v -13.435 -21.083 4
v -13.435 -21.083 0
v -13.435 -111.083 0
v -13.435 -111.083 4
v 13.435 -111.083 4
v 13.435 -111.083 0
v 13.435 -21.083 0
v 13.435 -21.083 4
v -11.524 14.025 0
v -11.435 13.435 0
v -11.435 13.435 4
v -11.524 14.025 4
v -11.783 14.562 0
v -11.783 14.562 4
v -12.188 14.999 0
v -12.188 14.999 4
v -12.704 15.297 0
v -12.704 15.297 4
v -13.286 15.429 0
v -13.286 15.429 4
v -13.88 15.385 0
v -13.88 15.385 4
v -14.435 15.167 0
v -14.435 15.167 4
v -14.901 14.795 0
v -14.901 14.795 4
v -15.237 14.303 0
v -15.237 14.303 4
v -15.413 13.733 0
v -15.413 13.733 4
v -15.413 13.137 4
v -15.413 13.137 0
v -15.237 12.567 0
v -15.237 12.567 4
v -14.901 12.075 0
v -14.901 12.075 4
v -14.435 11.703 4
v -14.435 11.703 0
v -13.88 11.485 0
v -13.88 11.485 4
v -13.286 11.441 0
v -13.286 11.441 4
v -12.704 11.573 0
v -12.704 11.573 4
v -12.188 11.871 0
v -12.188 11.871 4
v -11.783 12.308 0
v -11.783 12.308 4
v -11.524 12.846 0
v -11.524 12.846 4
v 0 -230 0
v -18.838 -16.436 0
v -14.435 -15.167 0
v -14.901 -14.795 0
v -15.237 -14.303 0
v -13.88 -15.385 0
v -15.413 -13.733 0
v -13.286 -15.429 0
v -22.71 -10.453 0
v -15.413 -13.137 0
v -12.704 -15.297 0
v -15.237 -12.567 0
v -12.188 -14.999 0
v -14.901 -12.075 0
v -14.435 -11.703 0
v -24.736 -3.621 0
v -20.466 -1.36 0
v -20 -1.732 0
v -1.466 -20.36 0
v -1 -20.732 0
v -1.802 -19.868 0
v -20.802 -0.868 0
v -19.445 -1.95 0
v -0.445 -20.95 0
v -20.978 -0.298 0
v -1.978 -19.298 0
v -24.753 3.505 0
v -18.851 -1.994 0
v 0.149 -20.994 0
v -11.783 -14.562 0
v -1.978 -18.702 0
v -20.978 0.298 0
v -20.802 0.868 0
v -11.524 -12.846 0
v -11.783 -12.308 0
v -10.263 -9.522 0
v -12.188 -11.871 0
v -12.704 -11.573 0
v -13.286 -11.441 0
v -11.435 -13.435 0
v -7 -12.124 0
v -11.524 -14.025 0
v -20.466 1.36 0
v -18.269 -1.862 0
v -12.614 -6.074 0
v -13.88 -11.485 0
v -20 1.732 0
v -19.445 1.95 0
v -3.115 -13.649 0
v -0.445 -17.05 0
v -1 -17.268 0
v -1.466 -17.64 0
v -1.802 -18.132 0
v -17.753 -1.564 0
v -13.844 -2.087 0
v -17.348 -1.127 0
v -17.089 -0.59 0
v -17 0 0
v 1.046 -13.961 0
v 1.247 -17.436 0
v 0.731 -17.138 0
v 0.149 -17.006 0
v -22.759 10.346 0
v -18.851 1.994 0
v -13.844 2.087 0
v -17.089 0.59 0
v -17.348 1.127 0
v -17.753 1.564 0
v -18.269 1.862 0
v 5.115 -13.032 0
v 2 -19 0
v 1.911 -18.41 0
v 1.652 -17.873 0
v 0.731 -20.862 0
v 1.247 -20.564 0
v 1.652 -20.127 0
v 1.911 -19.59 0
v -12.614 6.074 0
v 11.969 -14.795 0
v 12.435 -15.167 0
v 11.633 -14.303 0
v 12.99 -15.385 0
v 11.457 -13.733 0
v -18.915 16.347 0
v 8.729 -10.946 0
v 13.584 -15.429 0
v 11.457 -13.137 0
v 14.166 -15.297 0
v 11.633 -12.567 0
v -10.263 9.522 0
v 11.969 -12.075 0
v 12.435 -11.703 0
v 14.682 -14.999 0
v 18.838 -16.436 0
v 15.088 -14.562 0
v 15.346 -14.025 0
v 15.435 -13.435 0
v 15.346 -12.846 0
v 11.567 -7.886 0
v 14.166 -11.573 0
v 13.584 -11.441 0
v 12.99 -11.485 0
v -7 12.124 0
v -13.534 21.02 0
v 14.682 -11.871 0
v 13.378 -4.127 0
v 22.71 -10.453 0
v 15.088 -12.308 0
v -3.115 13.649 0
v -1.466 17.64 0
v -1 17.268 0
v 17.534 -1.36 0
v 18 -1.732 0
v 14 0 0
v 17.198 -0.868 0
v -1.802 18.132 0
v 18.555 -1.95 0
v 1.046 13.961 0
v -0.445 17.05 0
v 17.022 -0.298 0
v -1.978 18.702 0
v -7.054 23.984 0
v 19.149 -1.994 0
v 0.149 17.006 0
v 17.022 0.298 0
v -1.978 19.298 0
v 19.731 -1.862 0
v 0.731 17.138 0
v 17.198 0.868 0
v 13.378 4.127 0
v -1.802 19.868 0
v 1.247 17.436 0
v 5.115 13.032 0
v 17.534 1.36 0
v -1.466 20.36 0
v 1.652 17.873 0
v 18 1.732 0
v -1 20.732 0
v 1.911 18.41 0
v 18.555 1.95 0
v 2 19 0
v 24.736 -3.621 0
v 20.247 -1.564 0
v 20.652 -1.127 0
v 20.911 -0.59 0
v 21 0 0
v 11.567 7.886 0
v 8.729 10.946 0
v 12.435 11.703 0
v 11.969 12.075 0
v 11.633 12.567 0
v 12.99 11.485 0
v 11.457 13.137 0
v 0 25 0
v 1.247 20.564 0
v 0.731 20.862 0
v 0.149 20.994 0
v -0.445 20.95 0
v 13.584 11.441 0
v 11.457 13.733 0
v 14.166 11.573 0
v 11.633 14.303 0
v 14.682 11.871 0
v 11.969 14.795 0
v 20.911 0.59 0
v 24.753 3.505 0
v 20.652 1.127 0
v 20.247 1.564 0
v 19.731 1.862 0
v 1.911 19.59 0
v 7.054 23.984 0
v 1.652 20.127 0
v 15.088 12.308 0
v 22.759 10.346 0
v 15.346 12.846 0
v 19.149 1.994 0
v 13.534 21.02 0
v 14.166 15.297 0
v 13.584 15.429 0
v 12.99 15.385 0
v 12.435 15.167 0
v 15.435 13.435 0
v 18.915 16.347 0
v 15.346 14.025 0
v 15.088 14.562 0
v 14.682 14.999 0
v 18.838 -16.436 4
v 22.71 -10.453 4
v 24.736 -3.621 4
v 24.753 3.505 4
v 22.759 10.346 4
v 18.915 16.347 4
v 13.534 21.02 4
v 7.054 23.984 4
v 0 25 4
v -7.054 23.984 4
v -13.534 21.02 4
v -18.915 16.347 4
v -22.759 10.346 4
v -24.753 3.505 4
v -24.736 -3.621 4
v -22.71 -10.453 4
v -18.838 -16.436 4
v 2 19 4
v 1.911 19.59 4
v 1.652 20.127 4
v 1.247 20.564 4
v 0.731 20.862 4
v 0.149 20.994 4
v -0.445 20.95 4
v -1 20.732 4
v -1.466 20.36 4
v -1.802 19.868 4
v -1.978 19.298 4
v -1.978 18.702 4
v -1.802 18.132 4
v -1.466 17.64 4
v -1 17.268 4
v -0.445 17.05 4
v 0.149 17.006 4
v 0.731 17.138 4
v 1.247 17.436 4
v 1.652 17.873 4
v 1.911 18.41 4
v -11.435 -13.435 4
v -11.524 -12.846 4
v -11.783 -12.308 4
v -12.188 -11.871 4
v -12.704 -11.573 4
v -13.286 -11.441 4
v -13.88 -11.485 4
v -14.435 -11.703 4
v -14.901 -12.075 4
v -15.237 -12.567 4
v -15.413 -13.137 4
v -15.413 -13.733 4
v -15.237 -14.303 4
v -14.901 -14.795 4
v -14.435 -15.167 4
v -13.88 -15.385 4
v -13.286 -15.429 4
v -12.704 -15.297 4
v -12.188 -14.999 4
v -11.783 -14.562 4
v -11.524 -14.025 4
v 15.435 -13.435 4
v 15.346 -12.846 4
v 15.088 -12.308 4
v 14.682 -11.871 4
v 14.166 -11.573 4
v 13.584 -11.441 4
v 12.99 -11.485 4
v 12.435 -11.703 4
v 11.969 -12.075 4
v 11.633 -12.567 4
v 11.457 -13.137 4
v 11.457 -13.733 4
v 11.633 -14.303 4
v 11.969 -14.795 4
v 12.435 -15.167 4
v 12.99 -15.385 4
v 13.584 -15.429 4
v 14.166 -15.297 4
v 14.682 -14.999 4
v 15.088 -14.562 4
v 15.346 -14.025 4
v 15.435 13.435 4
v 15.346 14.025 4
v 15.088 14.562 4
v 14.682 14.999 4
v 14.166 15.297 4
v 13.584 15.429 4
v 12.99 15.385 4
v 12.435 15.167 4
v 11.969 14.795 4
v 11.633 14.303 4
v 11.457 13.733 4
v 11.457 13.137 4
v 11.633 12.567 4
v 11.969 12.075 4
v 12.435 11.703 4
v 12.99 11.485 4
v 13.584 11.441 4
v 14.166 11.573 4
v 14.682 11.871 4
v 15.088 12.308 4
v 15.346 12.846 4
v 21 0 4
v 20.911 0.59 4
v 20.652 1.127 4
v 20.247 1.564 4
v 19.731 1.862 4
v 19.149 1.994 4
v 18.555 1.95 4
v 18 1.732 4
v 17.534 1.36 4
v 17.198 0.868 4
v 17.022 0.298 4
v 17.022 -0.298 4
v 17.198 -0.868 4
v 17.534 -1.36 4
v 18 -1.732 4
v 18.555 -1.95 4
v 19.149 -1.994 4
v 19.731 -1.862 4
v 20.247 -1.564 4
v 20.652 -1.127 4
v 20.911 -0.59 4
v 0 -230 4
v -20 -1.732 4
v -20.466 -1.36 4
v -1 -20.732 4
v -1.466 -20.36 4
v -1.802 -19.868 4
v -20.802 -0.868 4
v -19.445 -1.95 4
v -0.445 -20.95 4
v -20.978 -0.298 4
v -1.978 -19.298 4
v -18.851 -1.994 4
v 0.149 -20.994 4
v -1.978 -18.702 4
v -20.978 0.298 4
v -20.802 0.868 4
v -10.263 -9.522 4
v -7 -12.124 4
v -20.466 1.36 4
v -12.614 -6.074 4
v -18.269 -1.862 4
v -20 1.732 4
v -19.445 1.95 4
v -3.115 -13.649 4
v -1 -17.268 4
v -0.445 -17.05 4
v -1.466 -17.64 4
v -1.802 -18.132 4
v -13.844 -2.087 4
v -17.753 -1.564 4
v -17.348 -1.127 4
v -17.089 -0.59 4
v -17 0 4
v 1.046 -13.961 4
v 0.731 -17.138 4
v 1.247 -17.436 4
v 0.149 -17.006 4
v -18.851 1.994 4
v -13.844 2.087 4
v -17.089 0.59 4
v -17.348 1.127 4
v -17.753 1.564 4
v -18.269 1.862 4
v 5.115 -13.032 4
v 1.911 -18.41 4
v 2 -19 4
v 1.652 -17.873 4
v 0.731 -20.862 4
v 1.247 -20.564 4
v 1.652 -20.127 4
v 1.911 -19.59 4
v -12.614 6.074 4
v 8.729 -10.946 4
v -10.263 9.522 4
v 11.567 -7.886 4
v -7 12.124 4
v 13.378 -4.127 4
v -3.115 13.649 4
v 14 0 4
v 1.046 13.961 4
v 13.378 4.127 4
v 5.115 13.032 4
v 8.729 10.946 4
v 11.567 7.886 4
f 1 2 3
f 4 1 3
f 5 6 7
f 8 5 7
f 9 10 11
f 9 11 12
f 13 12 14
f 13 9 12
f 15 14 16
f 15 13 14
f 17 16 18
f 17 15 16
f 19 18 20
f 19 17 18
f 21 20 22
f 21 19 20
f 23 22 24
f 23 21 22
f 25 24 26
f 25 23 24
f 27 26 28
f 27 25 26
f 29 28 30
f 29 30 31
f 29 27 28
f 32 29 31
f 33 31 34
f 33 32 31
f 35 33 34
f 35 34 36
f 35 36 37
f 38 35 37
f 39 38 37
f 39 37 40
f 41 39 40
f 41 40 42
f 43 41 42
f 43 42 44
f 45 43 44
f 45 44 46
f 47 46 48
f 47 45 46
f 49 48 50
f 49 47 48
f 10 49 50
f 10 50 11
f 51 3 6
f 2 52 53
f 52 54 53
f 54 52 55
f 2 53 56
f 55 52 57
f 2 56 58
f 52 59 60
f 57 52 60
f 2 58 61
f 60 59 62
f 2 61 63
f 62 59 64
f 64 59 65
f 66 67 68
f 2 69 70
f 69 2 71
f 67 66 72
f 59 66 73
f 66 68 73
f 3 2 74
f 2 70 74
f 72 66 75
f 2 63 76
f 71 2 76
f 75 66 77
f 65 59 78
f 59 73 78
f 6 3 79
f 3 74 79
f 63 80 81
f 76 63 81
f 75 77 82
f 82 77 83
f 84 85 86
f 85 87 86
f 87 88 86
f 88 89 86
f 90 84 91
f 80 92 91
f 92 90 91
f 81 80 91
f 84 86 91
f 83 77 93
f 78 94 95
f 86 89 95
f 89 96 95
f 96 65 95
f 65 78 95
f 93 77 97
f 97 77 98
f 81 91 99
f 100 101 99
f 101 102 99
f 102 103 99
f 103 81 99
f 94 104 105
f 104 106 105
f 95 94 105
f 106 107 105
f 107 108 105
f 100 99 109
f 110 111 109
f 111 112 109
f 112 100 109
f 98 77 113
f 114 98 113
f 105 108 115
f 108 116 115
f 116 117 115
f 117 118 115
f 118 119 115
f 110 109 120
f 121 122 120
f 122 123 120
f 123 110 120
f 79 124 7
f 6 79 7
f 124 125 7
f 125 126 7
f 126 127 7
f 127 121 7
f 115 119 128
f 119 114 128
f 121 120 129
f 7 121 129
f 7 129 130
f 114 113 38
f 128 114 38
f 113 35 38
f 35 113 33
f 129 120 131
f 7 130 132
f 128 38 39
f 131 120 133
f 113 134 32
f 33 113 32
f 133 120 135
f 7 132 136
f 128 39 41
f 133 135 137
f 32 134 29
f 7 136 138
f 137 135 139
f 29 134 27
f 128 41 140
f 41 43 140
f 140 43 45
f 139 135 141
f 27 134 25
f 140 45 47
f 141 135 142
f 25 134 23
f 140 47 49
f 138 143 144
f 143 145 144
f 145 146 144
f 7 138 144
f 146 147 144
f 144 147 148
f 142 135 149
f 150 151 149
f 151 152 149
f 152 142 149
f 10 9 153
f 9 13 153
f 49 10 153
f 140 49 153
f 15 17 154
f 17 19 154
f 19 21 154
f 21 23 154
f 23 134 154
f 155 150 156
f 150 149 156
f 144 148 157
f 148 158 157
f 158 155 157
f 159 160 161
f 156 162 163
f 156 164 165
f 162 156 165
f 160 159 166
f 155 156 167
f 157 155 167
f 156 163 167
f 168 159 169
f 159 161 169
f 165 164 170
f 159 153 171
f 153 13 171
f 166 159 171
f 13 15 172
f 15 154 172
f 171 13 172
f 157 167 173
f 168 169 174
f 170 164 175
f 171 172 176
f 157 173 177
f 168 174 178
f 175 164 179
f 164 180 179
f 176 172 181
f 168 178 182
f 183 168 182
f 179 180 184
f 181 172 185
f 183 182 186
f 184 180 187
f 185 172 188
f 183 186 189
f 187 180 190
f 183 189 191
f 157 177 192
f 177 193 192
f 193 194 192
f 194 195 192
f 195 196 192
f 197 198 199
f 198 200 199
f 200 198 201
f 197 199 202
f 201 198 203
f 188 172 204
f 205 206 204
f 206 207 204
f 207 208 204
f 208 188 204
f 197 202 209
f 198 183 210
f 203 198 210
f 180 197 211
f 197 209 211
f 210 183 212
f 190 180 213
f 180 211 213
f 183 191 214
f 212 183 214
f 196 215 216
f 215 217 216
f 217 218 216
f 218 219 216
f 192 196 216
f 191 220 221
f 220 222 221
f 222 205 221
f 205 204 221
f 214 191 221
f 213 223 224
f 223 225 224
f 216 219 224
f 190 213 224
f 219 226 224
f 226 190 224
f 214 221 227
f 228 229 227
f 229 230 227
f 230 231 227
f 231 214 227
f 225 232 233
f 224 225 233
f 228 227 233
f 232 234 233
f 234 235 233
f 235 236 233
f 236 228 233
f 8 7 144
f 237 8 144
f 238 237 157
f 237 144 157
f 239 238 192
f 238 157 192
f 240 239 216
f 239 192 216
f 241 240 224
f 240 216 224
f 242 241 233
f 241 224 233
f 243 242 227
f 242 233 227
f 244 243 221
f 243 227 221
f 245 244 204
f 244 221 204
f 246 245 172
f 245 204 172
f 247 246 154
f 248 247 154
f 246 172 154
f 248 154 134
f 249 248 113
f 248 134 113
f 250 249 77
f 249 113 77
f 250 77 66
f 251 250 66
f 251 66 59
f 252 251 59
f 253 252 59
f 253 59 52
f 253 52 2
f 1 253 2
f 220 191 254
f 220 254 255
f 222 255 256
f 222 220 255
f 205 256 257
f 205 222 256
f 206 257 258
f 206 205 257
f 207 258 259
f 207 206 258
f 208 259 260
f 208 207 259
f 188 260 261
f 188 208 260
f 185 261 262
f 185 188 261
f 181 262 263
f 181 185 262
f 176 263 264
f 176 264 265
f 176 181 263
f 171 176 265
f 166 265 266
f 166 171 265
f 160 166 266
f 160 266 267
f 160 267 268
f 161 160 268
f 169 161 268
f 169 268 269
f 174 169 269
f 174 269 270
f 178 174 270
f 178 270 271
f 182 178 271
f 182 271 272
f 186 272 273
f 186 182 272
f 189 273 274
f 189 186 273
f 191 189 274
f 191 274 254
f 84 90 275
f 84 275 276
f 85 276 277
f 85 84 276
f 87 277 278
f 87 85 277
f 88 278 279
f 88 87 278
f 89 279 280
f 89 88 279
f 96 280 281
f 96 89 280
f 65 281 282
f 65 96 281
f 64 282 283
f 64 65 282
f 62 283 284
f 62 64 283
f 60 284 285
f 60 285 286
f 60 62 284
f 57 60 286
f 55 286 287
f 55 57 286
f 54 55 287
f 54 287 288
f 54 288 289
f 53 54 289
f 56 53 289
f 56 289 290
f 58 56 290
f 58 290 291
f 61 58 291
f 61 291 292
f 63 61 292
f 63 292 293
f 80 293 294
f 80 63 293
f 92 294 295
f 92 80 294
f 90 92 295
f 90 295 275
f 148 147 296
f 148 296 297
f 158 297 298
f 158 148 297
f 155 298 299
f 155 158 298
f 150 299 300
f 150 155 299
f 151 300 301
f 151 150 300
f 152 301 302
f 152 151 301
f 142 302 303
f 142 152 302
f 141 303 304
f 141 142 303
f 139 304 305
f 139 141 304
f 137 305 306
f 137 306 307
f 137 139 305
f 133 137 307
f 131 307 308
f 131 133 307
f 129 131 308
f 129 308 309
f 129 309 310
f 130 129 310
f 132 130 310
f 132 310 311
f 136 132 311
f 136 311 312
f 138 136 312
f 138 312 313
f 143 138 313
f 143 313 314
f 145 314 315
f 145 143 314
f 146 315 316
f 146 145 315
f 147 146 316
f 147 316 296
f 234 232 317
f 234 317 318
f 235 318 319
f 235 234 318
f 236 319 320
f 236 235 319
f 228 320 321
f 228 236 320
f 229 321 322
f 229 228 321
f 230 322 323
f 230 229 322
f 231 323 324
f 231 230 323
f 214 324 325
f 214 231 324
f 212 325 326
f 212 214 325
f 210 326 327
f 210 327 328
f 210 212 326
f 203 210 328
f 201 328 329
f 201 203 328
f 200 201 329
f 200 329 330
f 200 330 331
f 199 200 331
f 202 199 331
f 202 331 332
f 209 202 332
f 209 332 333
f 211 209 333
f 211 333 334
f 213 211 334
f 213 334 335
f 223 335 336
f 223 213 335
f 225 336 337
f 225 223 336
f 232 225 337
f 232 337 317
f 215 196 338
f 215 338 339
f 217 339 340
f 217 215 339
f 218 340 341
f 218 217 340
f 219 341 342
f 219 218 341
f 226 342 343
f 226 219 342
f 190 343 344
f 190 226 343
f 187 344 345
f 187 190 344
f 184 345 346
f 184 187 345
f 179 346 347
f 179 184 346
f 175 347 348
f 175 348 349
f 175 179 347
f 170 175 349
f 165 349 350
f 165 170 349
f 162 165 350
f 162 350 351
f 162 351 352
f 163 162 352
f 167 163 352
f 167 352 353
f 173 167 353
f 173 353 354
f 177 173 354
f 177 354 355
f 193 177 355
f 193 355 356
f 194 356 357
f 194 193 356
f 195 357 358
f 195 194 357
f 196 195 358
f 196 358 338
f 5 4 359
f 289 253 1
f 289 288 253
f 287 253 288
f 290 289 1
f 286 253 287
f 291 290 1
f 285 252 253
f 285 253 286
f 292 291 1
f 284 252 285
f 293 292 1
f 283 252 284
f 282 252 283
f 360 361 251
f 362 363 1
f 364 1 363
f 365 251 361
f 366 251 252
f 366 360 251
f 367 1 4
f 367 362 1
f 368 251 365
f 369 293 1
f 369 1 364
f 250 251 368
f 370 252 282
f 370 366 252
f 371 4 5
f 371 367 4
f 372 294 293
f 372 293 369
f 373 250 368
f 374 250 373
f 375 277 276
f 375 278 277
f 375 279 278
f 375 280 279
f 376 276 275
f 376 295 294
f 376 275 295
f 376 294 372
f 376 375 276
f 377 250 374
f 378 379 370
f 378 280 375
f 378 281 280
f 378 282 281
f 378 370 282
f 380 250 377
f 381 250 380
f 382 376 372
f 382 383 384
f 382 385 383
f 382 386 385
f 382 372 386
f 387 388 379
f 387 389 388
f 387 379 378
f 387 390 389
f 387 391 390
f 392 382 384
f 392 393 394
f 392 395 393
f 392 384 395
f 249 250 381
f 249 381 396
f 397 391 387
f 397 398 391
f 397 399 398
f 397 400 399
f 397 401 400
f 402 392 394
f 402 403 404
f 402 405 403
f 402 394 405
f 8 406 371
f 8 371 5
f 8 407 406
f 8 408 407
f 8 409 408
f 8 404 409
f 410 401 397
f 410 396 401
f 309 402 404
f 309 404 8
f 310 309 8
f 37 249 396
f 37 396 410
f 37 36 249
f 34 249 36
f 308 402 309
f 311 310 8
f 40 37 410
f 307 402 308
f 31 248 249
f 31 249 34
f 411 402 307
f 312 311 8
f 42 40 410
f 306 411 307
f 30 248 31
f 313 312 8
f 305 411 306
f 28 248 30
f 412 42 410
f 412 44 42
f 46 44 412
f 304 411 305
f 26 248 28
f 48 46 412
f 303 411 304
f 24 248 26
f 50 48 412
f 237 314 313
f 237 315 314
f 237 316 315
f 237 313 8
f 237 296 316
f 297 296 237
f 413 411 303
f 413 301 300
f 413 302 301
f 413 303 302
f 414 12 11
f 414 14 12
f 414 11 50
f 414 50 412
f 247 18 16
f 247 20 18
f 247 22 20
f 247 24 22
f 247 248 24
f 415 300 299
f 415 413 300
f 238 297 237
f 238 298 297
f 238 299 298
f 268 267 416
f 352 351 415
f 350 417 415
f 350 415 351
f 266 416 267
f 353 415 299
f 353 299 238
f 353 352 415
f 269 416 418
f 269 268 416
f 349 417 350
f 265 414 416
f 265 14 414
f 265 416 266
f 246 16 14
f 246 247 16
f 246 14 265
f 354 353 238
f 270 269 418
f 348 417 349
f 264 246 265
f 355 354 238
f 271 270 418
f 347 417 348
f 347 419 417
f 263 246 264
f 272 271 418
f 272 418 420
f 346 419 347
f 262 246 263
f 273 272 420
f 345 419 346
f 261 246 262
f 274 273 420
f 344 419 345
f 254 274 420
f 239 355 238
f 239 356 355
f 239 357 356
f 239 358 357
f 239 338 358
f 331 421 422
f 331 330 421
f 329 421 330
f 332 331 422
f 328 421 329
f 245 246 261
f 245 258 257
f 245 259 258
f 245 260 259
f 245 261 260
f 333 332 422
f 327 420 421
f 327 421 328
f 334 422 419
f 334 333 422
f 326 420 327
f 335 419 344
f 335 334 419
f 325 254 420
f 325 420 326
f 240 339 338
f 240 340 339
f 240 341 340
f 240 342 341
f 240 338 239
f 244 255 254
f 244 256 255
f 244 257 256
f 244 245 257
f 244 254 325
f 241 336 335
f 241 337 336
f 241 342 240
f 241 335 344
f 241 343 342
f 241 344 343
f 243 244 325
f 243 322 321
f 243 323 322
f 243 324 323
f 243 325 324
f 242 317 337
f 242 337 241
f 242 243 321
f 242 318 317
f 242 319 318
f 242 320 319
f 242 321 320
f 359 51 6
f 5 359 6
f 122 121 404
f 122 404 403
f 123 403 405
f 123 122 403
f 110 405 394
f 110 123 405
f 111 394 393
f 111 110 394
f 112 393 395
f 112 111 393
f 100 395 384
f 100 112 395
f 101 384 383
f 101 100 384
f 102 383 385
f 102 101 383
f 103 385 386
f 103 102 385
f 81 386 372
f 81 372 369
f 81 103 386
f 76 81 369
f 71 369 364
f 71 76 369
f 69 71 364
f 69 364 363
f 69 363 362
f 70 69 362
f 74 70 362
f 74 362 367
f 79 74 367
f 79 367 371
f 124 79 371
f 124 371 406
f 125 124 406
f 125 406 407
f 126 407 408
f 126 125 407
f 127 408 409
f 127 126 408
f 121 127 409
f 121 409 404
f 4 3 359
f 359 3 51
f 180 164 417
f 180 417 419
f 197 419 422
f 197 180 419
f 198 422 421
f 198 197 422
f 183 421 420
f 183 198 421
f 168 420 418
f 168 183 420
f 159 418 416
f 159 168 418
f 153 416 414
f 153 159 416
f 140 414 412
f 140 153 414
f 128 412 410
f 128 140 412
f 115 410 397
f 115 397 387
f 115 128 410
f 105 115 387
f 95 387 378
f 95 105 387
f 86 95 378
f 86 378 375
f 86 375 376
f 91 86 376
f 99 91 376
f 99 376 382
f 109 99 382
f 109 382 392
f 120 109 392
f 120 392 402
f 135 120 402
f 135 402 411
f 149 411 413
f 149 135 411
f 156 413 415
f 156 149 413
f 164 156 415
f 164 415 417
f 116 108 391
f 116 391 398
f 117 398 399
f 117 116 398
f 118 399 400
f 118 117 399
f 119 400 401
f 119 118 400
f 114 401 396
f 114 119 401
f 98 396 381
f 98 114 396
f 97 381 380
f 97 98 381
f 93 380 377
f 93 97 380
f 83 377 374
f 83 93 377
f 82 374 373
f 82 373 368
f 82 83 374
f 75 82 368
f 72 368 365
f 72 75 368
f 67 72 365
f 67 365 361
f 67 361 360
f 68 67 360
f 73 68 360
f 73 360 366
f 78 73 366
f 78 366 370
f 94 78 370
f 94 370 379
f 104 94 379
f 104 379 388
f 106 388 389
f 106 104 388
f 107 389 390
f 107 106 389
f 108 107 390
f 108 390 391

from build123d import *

# Parameters (mm, degrees)
SKETCH_1_R      = 14
SKETCH_1_R_2    = 2
EXTRUDE_1_DEPTH = 4


with BuildPart() as part:
    # 草图1 → 凸台-拉伸1 (new body)
    with BuildSketch(Plane.XY):
        with BuildLine():
            Line((-13.435028843, -21.083168642), (-13.435028843, -111.083168642))
            Line((-13.435028843, -111.083168642), (0, -230))
            Line((0, -230), (13.435028843, -111.083168642))
            Line((13.435028843, -111.083168642), (13.435028843, -21.083168642))
            ThreePointArc((13.435028843, -21.083168642), (0, 25), (-13.435028843, -21.083168642))
        make_face()
        Circle(SKETCH_1_R, mode=Mode.SUBTRACT)
        with Locations((0, 19)):
            Circle(SKETCH_1_R_2, mode=Mode.SUBTRACT)
        with Locations((13.435028843, 13.435028843)):
            Circle(SKETCH_1_R_2, mode=Mode.SUBTRACT)
        with Locations((19, 0)):
            Circle(SKETCH_1_R_2, mode=Mode.SUBTRACT)
        with Locations((13.435028843, -13.435028843)):
            Circle(SKETCH_1_R_2, mode=Mode.SUBTRACT)
        with Locations((0, -19)):
            Circle(SKETCH_1_R_2, mode=Mode.SUBTRACT)
        with Locations((-13.435028843, -13.435028843)):
            Circle(SKETCH_1_R_2, mode=Mode.SUBTRACT)
        with Locations((-19, 0)):
            Circle(SKETCH_1_R_2, mode=Mode.SUBTRACT)
        with Locations((-13.435028843, 13.435028843)):
            Circle(SKETCH_1_R_2, mode=Mode.SUBTRACT)
    extrude(amount=EXTRUDE_1_DEPTH)


solid = part.part
